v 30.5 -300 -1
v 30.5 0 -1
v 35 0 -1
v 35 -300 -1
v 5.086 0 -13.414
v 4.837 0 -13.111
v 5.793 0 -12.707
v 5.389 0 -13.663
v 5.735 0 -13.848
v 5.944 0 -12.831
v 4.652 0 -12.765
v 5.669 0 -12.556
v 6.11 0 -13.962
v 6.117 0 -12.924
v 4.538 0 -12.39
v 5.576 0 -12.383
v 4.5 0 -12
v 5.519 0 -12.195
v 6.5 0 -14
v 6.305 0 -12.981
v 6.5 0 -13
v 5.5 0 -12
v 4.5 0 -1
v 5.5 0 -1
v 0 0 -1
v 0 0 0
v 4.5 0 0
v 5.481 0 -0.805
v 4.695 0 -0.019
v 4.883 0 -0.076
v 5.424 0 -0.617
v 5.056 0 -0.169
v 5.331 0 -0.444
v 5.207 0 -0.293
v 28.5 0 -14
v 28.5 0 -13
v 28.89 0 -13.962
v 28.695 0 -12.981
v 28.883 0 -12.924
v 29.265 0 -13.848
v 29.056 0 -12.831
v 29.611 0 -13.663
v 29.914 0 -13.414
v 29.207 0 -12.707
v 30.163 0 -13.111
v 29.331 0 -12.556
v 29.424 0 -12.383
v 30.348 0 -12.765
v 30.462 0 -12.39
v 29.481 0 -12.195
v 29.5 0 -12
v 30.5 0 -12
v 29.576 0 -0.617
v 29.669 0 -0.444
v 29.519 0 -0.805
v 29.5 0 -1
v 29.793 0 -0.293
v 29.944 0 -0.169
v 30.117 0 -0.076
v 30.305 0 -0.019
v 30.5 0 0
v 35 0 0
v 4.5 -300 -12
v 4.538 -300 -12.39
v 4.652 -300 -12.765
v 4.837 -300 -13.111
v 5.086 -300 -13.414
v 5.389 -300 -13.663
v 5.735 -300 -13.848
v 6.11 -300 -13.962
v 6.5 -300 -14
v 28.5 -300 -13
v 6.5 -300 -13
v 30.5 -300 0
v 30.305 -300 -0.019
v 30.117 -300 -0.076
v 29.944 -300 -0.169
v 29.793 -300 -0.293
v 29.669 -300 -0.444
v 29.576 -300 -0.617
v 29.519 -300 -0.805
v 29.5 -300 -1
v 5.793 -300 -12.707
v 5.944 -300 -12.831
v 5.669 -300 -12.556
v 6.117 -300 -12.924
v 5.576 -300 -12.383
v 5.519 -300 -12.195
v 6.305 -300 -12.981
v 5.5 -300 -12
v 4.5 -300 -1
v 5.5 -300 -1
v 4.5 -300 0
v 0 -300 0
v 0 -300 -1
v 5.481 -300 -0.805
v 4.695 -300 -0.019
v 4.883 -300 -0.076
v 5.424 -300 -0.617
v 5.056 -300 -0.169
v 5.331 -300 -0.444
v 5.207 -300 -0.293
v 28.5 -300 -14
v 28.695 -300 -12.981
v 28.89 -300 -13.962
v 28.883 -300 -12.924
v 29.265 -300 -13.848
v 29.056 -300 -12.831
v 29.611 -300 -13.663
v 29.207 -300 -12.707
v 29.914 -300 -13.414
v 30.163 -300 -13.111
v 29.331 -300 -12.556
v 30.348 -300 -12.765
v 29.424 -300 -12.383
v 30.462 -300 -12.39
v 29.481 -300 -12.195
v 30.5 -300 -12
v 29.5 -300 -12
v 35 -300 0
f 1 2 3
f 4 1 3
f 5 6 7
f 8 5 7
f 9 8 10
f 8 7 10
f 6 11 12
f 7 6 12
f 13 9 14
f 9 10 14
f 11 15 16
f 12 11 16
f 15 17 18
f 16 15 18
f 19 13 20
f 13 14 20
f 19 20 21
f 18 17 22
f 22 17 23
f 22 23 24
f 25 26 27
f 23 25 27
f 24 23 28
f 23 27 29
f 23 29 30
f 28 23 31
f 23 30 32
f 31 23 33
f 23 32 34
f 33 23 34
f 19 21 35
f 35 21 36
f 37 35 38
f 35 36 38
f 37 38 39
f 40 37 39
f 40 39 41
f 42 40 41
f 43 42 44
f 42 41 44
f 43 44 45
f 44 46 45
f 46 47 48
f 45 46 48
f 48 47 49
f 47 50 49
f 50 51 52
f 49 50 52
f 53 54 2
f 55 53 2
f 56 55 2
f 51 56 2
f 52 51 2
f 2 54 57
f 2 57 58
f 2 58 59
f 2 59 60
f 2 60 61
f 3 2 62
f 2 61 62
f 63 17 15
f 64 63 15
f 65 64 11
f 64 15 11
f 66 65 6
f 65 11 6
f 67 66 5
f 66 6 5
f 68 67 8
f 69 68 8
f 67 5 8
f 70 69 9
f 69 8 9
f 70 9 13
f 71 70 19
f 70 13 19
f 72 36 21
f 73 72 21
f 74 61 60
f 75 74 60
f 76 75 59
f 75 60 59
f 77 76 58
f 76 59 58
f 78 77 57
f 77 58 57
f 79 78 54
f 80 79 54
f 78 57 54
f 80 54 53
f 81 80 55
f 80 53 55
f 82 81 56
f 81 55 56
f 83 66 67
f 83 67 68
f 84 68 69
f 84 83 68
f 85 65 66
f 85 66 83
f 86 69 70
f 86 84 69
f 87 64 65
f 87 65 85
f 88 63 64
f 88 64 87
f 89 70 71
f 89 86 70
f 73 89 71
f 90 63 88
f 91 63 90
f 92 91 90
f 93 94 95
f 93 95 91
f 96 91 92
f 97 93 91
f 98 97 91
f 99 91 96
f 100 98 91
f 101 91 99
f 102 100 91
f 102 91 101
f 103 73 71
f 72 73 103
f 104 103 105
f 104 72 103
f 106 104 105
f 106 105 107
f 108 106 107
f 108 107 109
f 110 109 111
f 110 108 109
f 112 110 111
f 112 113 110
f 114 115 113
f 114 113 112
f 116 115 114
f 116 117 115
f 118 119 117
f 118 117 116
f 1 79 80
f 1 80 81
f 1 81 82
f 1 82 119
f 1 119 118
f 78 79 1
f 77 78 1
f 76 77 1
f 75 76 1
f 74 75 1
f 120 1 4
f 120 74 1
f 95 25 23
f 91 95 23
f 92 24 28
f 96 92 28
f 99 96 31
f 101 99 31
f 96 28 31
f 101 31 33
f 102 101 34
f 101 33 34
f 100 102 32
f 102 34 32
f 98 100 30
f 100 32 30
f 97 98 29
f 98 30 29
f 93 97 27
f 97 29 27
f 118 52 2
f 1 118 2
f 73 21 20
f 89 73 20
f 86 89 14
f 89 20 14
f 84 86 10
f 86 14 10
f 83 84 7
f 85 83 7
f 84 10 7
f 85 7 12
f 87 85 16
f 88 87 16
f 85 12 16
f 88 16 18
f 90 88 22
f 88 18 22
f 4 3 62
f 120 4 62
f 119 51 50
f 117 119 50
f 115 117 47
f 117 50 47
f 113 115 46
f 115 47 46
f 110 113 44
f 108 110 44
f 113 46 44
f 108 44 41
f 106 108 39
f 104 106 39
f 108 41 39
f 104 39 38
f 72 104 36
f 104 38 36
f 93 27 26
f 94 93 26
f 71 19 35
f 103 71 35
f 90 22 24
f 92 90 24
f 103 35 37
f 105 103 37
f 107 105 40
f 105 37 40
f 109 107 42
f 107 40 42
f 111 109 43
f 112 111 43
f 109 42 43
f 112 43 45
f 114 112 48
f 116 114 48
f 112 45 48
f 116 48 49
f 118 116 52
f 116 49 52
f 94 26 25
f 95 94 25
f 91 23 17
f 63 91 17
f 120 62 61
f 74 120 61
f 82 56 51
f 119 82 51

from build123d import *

# Parameters (mm, degrees)
F1_DEPTH = 300


with BuildPart() as f1:
    # F0 (on Front) → F1 (new body)
    with BuildSketch(Plane.XZ):
        with BuildLine():
            Line((4.5, 0), (0, 0))
            Line((0, 0), (0, -1))
            Line((0, -1), (4.5, -1))
            Line((4.5, -1), (4.5, -12))
            ThreePointArc((4.5, -12), (5.085786, -13.414214), (6.5, -14))
            Line((6.5, -14), (28.5, -14))
            ThreePointArc((28.5, -14), (29.914214, -13.414214), (30.5, -12))
            Line((30.5, -12), (30.5, -1))
            Line((30.5, -1), (35, -1))
            Line((35, -1), (35, 0))
            Line((35, 0), (30.5, 0))
            ThreePointArc((30.5, 0), (29.792893, -0.292893), (29.5, -1))
            Line((29.5, -1), (29.5, -12))
            ThreePointArc((29.5, -12), (29.207107, -12.707107), (28.5, -13))
            Line((28.5, -13), (6.5, -13))
            ThreePointArc((6.5, -13), (5.792893, -12.707107), (5.5, -12))
            Line((5.5, -12), (5.5, -1))
            ThreePointArc((5.5, -1), (5.207107, -0.292893), (4.5, 0))
        make_face()
    extrude(amount=F1_DEPTH)


solid = f1.part
